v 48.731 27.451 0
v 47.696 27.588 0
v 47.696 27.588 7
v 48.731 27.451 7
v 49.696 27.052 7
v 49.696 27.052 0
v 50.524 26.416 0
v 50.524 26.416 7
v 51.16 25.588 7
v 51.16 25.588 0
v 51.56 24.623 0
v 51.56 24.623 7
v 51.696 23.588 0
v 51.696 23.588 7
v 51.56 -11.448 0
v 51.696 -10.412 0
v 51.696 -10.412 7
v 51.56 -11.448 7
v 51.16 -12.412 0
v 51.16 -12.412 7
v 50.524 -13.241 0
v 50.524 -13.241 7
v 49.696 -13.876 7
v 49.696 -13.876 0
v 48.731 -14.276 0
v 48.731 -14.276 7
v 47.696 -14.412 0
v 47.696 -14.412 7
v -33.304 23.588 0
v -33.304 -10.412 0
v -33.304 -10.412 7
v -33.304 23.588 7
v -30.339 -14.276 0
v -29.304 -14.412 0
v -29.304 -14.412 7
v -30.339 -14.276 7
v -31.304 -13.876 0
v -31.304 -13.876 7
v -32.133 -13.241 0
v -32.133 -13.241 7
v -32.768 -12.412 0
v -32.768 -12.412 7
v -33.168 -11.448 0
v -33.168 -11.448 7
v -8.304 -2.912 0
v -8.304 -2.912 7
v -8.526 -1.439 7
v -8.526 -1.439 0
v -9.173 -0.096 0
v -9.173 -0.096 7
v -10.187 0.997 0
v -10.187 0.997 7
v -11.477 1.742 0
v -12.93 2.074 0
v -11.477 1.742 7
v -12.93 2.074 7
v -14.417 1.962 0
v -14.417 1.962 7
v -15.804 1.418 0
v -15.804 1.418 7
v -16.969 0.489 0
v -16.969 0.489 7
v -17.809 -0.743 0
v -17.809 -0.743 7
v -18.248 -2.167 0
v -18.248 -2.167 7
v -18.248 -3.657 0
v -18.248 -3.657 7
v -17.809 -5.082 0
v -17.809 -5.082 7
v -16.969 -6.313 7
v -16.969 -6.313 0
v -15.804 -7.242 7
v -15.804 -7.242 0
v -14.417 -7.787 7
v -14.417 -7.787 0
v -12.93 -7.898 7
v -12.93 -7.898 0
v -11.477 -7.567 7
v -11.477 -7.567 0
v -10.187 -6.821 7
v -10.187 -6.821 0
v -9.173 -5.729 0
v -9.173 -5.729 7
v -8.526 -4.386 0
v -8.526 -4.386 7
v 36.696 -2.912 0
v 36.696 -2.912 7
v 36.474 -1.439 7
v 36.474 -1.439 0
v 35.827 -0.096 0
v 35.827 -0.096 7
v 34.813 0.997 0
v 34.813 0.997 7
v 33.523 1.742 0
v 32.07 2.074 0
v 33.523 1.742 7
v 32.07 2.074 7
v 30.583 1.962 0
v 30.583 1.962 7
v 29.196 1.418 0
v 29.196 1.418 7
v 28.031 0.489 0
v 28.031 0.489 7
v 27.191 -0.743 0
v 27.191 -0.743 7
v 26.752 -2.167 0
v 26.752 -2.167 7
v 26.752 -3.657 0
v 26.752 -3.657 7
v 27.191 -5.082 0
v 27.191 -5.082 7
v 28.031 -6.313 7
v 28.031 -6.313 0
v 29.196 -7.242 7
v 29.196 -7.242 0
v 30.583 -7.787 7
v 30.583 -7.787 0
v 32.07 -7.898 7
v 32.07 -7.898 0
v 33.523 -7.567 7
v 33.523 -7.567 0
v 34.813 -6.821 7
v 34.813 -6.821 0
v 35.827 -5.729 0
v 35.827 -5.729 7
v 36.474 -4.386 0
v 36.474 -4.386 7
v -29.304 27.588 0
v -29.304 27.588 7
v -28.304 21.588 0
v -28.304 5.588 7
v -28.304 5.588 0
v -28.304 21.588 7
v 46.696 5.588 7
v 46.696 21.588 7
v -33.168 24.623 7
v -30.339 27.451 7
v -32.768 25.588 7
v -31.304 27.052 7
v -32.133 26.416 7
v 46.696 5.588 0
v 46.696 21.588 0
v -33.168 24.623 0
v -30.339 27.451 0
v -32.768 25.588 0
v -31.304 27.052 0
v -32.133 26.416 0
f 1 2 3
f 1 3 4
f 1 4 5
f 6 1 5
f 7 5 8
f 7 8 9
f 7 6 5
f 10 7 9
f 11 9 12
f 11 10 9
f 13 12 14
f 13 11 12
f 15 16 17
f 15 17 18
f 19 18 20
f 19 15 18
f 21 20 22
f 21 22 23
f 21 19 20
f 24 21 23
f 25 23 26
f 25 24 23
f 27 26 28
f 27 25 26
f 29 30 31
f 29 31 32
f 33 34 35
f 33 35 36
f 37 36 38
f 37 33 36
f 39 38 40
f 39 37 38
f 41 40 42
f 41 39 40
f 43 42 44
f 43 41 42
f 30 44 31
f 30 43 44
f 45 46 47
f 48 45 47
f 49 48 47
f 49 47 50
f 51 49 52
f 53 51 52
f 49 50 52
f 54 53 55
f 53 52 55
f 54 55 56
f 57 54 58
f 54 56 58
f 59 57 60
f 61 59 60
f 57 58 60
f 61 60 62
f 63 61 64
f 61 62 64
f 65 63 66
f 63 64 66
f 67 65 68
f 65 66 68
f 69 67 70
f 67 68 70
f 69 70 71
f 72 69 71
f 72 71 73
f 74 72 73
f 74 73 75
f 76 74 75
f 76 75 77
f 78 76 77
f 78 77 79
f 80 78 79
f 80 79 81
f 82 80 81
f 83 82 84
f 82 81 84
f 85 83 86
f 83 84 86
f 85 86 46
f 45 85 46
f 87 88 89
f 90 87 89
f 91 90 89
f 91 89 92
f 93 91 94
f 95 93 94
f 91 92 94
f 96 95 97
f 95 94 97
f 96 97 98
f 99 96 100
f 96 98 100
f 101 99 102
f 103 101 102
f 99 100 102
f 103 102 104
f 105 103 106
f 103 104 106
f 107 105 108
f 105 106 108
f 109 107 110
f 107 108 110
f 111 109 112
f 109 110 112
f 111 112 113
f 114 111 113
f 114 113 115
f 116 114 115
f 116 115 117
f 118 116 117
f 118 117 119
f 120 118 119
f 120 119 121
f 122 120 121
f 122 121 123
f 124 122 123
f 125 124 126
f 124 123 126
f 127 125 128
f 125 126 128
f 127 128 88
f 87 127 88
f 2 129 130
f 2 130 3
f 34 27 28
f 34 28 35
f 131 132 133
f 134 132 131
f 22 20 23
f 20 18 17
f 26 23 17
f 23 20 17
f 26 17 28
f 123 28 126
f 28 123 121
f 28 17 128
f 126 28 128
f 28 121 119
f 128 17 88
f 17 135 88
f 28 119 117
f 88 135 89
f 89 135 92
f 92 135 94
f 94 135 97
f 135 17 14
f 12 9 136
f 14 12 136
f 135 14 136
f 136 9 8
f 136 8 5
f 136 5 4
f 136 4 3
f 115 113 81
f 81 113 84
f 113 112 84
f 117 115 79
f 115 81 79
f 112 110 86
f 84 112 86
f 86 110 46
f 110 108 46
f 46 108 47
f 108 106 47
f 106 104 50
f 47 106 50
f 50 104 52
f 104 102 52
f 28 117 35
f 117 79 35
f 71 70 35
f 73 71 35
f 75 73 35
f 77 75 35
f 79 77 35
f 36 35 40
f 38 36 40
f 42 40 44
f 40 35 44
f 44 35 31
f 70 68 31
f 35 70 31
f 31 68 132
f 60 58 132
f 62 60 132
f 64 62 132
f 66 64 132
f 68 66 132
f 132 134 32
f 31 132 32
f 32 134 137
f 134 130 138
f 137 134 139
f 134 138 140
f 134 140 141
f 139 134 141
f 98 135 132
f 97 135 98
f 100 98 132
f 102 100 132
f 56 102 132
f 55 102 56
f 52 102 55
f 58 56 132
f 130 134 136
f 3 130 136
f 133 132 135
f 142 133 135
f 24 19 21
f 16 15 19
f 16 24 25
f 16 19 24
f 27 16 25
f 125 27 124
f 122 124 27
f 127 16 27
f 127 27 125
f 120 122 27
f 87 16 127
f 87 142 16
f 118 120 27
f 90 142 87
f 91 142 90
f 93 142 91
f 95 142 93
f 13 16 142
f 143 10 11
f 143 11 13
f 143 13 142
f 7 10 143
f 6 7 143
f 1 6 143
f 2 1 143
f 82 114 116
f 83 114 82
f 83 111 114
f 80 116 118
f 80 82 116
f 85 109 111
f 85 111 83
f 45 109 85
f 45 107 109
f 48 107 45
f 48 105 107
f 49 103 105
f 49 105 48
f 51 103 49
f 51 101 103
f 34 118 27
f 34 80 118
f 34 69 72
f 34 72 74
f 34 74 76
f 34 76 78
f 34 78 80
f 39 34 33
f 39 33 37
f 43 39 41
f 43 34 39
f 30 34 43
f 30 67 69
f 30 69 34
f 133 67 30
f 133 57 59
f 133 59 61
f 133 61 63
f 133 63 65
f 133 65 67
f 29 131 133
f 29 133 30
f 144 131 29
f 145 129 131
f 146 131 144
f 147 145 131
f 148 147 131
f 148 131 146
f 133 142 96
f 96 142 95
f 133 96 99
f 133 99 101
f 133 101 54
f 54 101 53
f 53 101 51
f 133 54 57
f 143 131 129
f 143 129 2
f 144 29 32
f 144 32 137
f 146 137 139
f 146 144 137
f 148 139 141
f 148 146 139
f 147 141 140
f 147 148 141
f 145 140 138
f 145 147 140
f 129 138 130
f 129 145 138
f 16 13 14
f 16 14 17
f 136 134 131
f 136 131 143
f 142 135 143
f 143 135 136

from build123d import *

# Parameters (mm, degrees)
BOSS_EXTRUDE1_DEPTH = 7
SKETCH2_W           = 75
SKETCH2_H           = 16
CUT_EXTRUDE1_DEPTH  = 7
SKETCH3_R           = 5
CUT_EXTRUDE2_DEPTH  = 7


with BuildPart() as part:
    # Sketch1 → Boss-Extrude1 (new body)
    with BuildSketch(Plane.XY):
        with BuildLine():
            Line((-29.304093567, 27.587719298), (47.695906433, 27.587719298))
            ThreePointArc((47.695906433, 27.587719298), (50.524333557, 26.416146423), (51.695906433, 23.587719298))
            Line((51.695906433, 23.587719298), (51.695906433, -10.412280702))
            ThreePointArc((51.695906433, -10.412280702), (50.524333557, -13.240707827), (47.695906433, -14.412280702))
            Line((47.695906433, -14.412280702), (-29.304093567, -14.412280702))
            ThreePointArc((-29.304093567, -14.412280702), (-32.132520692, -13.240707827), (-33.304093567, -10.412280702))
            Line((-33.304093567, -10.412280702), (-33.304093567, 23.587719298))
            ThreePointArc((-33.304093567, 23.587719298), (-32.132520692, 26.416146423), (-29.304093567, 27.587719298))
        make_face()
    extrude(amount=BOSS_EXTRUDE1_DEPTH)

    # Sketch2 → Cut-Extrude1 (cut)
    with BuildSketch(Plane.XY.offset(7)):
        with Locations((9.195906433, 13.587719298)):
            Rectangle(SKETCH2_W, SKETCH2_H)
    extrude(amount=-CUT_EXTRUDE1_DEPTH, mode=Mode.SUBTRACT)

    # Sketch3 → Cut-Extrude2 (cut)
    with BuildSketch(Plane.XY.offset(7)):
        with Locations((31.695906433, -2.912280702)):
            Circle(SKETCH3_R)
        with Locations((-13.304093567, -2.912280702)):
            Circle(SKETCH3_R)
    extrude(amount=-CUT_EXTRUDE2_DEPTH, mode=Mode.SUBTRACT)


solid = part.part
